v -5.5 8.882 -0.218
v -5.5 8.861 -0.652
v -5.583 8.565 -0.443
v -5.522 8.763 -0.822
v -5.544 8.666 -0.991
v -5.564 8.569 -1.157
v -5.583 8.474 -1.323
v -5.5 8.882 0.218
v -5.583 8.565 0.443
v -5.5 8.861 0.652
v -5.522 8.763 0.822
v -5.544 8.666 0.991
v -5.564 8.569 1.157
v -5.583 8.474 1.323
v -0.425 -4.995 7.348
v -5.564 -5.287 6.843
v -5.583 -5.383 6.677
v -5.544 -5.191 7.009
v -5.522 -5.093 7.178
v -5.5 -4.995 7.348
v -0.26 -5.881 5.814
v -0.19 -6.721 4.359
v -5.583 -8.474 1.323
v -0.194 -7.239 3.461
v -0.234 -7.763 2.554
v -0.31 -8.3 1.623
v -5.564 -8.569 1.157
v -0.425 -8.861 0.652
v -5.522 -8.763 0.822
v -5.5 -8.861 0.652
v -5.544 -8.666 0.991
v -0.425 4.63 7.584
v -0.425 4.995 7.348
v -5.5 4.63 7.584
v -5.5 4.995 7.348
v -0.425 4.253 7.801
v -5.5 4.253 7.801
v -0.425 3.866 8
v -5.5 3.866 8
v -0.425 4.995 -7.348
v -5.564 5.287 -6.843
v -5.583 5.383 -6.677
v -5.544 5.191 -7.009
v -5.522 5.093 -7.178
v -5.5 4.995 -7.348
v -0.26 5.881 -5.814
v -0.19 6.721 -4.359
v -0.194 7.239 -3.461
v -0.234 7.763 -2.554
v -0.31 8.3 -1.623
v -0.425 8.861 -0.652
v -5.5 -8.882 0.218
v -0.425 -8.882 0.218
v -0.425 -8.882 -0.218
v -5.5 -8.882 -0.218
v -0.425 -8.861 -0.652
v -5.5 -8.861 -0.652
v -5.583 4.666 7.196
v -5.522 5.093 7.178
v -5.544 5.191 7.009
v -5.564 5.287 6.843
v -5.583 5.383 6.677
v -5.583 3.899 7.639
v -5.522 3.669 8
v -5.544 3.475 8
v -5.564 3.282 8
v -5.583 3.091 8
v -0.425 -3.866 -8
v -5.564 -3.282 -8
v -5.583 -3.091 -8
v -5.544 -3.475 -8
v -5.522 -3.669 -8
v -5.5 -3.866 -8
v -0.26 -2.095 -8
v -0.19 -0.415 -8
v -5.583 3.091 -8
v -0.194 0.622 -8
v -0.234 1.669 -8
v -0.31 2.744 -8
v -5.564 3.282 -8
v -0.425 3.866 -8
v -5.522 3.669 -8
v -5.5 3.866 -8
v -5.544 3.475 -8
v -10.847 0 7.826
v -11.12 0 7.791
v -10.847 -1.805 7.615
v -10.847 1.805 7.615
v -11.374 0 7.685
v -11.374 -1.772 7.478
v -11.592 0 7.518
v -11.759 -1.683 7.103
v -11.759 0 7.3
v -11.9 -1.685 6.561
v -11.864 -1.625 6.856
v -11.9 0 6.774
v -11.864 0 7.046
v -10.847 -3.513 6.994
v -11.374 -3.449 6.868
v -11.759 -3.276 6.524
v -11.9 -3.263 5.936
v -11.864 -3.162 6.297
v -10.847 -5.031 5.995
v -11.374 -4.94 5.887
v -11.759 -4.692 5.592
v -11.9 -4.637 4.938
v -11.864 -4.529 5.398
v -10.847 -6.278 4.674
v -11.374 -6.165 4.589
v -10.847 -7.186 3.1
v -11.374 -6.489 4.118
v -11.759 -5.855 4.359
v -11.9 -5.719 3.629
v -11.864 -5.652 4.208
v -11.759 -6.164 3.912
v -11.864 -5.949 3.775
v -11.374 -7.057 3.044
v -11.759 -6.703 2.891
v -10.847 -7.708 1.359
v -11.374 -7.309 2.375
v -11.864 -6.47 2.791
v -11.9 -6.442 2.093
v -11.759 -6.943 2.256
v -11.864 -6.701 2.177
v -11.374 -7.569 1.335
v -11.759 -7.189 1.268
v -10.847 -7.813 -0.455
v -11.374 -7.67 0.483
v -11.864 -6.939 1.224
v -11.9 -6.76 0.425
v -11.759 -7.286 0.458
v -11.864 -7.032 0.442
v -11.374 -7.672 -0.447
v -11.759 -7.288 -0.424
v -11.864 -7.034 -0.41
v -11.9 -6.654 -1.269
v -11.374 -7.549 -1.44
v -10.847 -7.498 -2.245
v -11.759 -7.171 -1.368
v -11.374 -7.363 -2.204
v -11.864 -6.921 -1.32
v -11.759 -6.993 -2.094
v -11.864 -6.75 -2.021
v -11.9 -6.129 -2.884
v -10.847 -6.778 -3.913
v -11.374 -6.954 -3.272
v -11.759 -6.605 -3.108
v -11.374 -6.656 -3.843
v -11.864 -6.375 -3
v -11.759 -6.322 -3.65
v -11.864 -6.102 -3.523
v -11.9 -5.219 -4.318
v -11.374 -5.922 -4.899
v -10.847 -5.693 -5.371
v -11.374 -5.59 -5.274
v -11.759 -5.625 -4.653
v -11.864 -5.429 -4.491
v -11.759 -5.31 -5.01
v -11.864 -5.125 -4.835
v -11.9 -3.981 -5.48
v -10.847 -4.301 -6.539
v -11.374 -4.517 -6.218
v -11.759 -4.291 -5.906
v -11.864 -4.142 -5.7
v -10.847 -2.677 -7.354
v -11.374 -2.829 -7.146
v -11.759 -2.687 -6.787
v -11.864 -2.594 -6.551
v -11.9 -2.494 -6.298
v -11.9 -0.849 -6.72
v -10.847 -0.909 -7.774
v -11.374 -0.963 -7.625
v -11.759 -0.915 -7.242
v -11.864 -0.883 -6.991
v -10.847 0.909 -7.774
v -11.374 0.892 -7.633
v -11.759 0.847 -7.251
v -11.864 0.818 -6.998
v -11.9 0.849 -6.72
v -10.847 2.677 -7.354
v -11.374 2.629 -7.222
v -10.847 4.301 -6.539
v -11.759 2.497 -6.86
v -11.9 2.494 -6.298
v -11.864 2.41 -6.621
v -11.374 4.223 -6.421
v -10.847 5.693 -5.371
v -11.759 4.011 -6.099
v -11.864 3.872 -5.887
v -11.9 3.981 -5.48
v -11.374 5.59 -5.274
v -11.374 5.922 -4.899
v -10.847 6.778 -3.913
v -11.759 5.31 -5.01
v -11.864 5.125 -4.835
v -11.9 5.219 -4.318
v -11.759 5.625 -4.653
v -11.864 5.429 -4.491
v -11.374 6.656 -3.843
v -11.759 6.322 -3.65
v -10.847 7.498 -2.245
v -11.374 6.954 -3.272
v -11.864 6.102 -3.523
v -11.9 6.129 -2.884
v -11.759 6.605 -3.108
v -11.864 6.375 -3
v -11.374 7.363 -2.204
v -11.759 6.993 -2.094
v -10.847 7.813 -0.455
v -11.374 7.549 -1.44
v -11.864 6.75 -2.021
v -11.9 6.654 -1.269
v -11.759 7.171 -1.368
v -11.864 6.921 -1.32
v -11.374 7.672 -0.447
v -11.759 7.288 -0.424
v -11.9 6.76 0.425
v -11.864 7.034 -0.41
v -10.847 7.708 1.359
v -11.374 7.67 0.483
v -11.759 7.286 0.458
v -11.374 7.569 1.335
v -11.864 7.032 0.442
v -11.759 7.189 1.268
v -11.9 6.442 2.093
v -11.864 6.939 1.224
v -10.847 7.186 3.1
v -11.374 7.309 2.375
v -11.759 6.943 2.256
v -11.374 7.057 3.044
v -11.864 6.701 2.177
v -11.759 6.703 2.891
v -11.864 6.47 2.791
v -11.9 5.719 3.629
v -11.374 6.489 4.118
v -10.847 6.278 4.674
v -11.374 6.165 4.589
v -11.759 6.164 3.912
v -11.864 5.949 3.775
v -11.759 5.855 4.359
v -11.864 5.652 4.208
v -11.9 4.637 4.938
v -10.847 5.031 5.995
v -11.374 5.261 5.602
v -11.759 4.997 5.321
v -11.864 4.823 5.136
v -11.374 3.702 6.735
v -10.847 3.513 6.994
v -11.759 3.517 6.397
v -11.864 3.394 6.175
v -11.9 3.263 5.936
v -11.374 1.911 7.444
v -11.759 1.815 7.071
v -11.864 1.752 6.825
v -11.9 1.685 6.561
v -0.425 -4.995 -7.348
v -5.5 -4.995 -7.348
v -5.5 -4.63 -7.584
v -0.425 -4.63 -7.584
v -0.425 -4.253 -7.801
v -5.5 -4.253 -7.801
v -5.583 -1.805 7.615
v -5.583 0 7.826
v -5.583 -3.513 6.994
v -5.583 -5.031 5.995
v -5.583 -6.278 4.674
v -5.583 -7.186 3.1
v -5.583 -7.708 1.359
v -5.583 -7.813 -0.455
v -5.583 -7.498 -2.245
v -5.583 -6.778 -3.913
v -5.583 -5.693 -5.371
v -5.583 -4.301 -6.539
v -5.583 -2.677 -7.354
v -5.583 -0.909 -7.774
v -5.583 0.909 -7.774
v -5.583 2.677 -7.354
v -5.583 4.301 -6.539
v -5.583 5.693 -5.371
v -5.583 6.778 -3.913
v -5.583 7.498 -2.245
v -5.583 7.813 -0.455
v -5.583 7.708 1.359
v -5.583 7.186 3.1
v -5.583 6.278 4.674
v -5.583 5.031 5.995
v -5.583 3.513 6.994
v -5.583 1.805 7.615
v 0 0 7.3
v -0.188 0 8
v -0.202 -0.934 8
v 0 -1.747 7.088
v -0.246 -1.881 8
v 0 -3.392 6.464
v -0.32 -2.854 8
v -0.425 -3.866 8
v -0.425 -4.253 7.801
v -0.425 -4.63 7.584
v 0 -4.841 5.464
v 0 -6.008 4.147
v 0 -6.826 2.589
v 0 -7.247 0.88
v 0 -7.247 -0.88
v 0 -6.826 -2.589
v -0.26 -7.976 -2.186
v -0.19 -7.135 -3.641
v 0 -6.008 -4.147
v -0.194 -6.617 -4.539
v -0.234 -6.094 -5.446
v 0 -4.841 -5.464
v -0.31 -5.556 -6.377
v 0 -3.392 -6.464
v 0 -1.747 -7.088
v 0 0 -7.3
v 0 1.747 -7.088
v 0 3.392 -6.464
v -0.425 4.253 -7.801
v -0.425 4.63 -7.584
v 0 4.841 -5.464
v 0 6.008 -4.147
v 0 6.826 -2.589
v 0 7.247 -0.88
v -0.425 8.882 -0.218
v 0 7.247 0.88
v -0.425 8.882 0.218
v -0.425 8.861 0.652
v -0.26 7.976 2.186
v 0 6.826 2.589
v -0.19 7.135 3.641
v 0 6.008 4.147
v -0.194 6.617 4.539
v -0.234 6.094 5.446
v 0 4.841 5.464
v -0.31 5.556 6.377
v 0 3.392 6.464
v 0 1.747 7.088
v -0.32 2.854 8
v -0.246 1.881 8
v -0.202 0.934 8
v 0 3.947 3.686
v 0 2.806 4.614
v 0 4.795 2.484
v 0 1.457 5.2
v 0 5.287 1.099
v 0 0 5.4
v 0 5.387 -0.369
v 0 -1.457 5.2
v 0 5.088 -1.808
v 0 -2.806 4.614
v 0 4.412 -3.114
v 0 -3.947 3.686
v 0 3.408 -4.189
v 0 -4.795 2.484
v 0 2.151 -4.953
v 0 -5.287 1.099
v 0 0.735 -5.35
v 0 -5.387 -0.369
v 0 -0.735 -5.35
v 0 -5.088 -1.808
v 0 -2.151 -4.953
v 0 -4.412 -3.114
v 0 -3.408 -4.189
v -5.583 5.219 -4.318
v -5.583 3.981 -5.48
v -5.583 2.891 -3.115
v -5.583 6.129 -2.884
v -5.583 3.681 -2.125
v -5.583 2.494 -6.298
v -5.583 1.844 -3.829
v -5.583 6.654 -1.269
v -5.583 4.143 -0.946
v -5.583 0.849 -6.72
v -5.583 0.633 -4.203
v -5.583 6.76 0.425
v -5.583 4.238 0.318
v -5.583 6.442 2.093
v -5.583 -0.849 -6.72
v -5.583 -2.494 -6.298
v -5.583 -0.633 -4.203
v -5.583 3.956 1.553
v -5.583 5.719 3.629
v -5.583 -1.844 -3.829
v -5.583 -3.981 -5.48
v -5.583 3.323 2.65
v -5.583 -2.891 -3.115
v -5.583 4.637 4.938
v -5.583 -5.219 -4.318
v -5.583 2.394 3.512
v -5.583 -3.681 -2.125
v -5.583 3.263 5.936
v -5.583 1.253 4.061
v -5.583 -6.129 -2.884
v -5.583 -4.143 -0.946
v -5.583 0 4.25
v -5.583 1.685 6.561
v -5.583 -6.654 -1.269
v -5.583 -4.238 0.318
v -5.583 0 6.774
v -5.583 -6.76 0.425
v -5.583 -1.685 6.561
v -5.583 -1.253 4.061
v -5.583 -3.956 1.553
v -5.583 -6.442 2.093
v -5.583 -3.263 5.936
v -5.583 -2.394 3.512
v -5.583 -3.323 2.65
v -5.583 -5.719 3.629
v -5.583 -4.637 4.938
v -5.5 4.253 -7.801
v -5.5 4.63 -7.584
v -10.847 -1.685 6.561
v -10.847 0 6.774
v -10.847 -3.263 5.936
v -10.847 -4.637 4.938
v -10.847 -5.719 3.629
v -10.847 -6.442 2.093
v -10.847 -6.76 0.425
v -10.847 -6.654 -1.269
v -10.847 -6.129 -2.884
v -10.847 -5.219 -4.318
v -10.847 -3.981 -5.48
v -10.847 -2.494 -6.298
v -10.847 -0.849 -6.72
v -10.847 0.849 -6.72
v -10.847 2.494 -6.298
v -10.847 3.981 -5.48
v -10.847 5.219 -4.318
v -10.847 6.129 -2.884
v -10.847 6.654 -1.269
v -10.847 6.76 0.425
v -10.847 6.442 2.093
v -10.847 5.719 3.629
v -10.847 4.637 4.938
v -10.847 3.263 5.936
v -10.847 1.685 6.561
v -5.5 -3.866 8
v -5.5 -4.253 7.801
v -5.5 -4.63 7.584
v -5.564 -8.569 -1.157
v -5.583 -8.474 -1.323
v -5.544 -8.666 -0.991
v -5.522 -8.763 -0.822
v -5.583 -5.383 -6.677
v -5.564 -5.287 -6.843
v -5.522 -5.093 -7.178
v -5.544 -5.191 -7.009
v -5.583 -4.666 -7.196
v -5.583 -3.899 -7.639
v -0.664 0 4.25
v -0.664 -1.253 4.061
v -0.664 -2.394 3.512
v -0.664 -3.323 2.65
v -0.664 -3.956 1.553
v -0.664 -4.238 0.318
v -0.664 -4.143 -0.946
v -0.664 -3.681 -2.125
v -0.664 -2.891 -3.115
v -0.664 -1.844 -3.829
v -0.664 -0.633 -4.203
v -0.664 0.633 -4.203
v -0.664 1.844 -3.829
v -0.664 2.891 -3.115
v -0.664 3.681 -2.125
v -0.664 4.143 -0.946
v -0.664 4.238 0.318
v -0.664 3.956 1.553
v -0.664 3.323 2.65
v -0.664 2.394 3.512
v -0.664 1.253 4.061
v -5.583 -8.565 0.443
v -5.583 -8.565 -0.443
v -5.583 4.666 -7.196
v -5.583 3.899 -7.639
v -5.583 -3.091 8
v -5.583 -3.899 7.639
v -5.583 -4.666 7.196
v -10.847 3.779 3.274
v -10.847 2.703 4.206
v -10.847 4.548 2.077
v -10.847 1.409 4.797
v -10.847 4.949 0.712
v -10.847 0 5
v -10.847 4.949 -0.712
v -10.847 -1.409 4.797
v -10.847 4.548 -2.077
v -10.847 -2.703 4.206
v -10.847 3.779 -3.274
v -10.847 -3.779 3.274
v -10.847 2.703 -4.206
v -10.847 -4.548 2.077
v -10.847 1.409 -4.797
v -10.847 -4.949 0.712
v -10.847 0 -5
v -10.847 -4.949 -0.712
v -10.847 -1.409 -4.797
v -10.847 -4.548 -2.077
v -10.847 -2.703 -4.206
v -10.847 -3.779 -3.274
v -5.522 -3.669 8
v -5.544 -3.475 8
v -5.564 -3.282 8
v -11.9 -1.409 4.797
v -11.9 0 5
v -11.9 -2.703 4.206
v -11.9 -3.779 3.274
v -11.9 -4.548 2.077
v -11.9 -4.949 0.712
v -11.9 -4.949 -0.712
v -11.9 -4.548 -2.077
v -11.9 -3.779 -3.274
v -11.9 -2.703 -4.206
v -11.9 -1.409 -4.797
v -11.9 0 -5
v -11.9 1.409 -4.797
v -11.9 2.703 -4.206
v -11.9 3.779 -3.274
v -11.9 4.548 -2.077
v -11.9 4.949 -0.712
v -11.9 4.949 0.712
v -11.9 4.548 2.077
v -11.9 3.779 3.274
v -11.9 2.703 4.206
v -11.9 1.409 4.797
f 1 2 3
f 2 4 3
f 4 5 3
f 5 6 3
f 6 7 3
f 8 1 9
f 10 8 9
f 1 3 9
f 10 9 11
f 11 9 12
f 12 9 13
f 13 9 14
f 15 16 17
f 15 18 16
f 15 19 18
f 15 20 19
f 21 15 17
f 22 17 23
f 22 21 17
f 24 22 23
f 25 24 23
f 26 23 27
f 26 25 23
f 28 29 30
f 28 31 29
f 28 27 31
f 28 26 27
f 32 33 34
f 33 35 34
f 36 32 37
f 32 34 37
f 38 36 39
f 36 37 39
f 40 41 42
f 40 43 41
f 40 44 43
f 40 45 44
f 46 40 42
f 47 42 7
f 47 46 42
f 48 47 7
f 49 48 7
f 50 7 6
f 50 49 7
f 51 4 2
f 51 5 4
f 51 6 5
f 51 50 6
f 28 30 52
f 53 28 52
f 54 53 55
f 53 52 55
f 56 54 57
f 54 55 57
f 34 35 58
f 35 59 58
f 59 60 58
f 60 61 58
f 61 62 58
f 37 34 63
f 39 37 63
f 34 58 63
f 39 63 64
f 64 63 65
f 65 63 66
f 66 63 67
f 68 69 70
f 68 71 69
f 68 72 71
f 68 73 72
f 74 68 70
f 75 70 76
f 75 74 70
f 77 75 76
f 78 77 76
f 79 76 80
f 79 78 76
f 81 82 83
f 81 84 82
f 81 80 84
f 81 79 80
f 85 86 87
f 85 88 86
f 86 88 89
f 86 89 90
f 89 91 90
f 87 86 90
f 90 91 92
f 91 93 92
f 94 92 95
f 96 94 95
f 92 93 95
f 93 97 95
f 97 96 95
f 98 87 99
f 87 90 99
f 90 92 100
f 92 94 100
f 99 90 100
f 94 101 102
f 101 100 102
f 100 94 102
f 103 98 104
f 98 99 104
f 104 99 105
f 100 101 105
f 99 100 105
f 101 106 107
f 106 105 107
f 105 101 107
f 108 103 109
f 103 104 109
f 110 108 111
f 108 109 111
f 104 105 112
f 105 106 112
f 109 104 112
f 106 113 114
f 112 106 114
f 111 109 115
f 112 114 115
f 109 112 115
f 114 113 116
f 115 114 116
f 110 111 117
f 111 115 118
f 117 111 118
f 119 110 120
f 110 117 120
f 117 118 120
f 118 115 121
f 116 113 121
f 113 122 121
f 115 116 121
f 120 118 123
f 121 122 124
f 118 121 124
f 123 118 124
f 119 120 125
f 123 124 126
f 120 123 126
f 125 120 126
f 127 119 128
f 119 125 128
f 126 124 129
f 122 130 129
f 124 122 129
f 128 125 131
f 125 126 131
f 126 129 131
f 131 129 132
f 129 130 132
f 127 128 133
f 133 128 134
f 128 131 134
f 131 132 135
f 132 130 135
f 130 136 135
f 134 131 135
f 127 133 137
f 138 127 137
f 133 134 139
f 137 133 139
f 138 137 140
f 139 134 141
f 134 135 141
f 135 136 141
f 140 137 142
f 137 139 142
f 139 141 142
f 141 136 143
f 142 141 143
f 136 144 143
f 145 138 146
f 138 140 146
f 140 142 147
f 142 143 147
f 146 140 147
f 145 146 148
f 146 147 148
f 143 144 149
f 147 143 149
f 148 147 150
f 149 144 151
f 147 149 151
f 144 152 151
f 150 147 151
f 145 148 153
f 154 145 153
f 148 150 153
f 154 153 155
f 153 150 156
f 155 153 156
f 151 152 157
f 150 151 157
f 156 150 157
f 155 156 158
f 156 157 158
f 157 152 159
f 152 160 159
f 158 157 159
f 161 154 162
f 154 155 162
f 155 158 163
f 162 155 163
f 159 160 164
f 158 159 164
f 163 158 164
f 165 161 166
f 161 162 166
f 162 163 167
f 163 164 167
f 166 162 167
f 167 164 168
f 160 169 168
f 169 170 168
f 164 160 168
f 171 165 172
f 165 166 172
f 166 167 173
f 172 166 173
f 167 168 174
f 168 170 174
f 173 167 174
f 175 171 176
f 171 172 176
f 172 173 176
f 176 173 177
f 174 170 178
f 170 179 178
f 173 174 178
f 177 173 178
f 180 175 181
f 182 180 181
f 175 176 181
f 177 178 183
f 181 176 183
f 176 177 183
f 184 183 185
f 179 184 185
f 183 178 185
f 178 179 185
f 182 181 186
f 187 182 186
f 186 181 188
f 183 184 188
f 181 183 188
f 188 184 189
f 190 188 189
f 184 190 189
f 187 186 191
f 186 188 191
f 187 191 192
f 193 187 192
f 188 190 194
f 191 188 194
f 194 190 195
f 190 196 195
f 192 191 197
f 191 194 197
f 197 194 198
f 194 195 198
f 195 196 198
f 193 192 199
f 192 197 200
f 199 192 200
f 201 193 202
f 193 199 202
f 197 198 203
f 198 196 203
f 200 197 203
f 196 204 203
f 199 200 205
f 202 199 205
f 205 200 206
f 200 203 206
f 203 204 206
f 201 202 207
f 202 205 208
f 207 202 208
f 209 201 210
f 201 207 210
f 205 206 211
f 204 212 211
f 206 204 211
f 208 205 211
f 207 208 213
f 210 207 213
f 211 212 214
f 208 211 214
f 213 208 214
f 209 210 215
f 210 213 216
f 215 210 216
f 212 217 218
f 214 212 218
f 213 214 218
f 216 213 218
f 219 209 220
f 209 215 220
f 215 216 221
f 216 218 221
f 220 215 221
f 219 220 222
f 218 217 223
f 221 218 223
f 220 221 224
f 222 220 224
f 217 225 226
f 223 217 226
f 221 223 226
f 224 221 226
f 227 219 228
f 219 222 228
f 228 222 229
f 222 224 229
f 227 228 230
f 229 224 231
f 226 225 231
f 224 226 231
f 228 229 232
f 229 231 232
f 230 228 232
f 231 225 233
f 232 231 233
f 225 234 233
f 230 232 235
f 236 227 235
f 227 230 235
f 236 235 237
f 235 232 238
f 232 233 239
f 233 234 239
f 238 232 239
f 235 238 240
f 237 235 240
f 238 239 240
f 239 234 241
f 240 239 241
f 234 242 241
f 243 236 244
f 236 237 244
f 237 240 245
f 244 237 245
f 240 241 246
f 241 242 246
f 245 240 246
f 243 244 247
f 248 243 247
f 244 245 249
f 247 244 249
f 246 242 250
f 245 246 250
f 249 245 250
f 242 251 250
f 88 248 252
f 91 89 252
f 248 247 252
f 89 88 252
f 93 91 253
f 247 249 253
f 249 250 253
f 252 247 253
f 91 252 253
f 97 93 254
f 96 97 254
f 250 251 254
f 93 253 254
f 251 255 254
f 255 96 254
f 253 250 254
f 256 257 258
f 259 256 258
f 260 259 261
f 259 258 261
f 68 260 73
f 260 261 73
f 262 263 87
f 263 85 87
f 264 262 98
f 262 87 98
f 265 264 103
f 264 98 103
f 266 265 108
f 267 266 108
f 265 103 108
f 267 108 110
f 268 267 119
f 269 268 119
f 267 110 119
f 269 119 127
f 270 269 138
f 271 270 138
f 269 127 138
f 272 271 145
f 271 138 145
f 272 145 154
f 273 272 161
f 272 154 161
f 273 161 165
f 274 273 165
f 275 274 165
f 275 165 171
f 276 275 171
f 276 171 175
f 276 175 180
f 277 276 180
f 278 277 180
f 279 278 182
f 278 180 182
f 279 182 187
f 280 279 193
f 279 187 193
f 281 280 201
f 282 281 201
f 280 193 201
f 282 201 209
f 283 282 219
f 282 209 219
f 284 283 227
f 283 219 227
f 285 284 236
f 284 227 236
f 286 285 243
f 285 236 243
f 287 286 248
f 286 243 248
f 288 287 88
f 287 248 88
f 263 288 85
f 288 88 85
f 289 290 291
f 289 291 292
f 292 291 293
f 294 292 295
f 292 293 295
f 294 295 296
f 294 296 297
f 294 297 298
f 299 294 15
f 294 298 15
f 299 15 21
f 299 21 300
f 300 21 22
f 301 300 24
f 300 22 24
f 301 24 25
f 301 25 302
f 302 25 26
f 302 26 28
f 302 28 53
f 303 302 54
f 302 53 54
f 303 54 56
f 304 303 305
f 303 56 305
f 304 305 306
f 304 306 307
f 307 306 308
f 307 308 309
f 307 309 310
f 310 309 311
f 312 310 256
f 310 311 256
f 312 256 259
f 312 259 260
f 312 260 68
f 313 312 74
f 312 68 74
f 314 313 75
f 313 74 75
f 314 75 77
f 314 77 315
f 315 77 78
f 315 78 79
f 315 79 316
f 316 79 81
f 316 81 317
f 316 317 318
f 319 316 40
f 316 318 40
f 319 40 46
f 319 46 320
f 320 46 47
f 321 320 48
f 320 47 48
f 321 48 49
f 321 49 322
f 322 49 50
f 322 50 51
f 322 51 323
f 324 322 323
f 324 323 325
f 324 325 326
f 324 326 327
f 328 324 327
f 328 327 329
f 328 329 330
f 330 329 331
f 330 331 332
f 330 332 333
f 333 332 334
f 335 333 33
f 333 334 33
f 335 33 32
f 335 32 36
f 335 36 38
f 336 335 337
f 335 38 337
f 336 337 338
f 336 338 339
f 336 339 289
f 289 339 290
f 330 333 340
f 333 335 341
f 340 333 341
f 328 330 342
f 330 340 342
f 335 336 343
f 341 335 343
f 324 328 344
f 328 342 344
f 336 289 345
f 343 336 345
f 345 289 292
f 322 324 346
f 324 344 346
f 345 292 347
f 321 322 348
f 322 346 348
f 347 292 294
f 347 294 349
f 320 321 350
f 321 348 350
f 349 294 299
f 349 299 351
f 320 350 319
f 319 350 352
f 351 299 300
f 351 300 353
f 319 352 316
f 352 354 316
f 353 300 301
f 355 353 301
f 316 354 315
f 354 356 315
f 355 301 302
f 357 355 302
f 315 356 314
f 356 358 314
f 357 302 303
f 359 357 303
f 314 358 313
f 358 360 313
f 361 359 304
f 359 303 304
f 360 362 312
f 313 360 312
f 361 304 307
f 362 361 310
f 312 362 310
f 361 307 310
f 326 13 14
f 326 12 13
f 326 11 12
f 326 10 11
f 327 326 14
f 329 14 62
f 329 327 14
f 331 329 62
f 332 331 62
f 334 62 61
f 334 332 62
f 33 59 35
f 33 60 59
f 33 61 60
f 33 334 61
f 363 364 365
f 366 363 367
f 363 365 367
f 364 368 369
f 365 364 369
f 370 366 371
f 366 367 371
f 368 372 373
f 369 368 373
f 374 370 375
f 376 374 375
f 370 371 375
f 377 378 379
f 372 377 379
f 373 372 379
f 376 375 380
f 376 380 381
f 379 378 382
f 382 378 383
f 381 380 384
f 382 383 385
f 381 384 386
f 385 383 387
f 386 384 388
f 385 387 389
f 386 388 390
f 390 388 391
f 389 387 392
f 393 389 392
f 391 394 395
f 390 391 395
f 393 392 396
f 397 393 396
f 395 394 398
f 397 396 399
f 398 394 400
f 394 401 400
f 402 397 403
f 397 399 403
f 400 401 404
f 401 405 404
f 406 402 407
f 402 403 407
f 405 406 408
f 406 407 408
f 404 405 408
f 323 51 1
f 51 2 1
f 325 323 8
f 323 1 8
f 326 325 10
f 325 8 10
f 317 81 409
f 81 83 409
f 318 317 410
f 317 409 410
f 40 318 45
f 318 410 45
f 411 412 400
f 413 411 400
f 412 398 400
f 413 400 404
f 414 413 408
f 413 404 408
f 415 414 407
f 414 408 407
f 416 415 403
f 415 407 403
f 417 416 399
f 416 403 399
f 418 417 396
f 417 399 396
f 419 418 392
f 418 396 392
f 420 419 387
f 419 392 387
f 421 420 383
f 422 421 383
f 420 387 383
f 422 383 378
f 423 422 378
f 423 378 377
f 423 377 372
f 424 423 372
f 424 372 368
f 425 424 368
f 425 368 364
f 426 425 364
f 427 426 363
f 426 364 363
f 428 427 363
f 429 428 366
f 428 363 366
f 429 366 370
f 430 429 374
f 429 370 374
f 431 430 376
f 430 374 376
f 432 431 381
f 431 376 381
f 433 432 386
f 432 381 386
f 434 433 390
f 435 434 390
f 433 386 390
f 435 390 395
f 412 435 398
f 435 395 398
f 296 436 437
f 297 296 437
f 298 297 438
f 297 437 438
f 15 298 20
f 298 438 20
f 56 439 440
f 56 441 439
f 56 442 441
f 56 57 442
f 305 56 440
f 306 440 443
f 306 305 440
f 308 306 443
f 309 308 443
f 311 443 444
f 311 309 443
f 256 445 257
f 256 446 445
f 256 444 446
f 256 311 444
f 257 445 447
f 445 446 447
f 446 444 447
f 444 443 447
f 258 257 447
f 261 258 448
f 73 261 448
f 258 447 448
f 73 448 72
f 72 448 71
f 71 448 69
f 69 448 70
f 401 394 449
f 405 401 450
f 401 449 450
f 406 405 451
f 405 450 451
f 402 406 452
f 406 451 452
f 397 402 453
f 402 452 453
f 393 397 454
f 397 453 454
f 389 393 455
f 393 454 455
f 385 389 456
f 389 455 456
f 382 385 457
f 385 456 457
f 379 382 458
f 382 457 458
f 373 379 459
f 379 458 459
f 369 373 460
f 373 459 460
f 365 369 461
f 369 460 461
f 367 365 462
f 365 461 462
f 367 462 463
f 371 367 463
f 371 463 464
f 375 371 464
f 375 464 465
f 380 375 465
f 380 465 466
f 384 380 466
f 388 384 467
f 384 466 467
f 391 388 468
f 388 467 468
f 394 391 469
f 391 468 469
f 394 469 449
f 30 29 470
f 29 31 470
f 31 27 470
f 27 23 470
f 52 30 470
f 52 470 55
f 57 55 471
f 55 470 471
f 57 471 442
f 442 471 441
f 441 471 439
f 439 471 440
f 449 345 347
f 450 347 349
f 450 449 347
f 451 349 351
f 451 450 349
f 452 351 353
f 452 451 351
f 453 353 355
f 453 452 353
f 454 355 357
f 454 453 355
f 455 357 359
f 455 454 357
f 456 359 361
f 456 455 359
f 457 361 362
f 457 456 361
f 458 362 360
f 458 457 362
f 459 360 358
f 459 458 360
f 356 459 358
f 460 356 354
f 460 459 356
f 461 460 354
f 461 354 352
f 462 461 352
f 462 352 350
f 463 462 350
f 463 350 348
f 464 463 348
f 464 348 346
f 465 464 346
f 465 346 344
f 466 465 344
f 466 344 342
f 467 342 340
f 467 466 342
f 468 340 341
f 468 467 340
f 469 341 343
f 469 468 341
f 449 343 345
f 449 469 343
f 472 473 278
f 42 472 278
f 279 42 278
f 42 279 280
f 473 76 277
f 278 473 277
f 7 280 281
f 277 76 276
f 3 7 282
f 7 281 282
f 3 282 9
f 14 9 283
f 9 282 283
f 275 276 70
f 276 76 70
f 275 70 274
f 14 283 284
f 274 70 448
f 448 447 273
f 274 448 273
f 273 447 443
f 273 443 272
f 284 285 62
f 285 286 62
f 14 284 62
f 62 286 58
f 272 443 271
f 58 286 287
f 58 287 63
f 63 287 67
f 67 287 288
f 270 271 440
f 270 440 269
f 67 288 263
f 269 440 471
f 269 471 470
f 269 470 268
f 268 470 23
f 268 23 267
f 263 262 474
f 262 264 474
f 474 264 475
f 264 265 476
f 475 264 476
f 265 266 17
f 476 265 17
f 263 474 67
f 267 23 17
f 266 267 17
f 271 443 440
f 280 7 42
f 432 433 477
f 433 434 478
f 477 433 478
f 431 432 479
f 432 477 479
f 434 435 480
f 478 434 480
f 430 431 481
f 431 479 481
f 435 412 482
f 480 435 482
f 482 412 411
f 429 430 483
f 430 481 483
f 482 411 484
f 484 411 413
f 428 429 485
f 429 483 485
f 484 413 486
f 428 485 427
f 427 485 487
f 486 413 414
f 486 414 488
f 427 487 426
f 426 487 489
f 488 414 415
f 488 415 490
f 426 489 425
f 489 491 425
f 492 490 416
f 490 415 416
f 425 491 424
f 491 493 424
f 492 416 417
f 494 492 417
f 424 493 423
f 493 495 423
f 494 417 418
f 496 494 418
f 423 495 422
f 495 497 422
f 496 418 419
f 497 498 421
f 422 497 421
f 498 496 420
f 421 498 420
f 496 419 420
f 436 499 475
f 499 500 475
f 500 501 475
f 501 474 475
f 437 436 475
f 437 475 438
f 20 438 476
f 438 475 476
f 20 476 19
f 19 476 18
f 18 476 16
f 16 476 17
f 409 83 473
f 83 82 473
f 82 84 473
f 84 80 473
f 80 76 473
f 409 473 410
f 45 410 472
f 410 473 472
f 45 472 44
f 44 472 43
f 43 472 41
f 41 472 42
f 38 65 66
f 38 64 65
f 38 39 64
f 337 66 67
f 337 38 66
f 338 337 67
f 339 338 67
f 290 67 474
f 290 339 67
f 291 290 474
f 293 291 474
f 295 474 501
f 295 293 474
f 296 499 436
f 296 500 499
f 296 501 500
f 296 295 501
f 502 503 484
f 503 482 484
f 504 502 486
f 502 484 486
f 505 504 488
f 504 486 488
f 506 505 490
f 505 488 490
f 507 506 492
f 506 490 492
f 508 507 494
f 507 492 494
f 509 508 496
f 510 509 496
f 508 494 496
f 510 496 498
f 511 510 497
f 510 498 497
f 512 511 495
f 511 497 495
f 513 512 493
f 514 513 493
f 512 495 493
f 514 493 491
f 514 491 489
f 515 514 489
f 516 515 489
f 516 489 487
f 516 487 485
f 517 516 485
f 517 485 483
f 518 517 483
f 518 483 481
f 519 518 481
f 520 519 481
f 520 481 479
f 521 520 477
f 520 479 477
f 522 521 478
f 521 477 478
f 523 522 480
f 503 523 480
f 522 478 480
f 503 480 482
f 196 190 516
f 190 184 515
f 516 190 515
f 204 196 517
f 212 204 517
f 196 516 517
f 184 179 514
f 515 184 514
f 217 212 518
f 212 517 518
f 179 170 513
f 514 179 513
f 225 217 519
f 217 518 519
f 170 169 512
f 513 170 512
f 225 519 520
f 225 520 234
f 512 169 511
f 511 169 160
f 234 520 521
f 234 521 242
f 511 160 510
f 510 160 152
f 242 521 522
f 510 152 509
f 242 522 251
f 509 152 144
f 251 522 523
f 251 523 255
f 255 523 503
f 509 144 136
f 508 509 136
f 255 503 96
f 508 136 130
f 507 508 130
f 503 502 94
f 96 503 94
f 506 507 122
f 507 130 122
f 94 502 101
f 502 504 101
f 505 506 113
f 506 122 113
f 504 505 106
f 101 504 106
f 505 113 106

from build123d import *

# Parameters (mm, degrees)
SKETCH_2_OUTSIDE_W  = 25.332
SKETCH_2_OUTSIDE_H  = 25.332
CUT_EXTRUDE_1_DEPTH = 18.305965734


with BuildPart() as part:
    # Эскиз1 → Повернуть1 (revolve)
    with BuildSketch(Plane.XY, mode=Mode.PRIVATE) as revolve_1_sk:
        with BuildLine():
            Line((-11.9, 6.773556454), (-11.9, 5))
            Line((-11.9, 5), (-10.847112909, 5))
            Line((-10.847112909, 5), (-10.847112909, 6.773556454))
            Line((-10.847112909, 6.773556454), (-5.582677453, 6.773556454))
            Line((-5.582677453, 6.773556454), (-5.582677453, 4.25))
            Line((-5.582677453, 4.25), (0, 4.25))
            Line((0, 4.25), (0, 7.3))
            Line((0, 7.3), (-0.42469947, 8.885))
            Line((-0.42469947, 8.885), (-5.5, 8.885))
            Line((-5.5, 8.885), (-5.582677453, 8.576443546))
            Line((-5.582677453, 8.576443546), (-5.582677453, 7.826443546))
            Line((-5.582677453, 7.826443546), (-10.847112909, 7.826443546))
            ThreePointArc((-10.847112909, 7.826443546), (-11.591616511, 7.518060056), (-11.9, 6.773556454))
        make_face()
    revolve(revolve_1_sk.sketch.rotate(Axis((-1000, 0, 0), (1, 0, 0)), 90), axis=Axis((-1000, 0, 0), (1, 0, 0)))

    # Эскиз2 outside → Вырез-Вытянуть1 (cut, through all)
    with BuildSketch(Plane(origin=(0, 0, 0), x_dir=(0, 0, -1), z_dir=(1, 0, 0))):
        Rectangle(SKETCH_2_OUTSIDE_W, SKETCH_2_OUTSIDE_H)
        Polygon((8, -4.618802154), (8, 4.618802154), (0, 9.237604307), (-8, 4.618802154), (-8, -4.618802154), (0, -9.237604307), align=None, mode=Mode.SUBTRACT)
    extrude(amount=-CUT_EXTRUDE_1_DEPTH, mode=Mode.SUBTRACT)

    # Эскиз3 → Вырез-Повернуть1 (revolve, cut)
    with BuildSketch(Plane.XY, mode=Mode.PRIVATE) as cut_revolve_1_sk:
        Polygon((0, 0), (0, 5.4), (-0.66395281, 4.25), (-0.66395281, 0), align=None)
    revolve(cut_revolve_1_sk.sketch.rotate(Axis((-0.66395281, 0, 0), (1.0, -1.853694946210833e-11, 0)), 90.000000001), axis=Axis((-0.66395281, 0, 0), (1.0, -1.853694946210833e-11, 0)), mode=Mode.SUBTRACT)


solid = part.part
